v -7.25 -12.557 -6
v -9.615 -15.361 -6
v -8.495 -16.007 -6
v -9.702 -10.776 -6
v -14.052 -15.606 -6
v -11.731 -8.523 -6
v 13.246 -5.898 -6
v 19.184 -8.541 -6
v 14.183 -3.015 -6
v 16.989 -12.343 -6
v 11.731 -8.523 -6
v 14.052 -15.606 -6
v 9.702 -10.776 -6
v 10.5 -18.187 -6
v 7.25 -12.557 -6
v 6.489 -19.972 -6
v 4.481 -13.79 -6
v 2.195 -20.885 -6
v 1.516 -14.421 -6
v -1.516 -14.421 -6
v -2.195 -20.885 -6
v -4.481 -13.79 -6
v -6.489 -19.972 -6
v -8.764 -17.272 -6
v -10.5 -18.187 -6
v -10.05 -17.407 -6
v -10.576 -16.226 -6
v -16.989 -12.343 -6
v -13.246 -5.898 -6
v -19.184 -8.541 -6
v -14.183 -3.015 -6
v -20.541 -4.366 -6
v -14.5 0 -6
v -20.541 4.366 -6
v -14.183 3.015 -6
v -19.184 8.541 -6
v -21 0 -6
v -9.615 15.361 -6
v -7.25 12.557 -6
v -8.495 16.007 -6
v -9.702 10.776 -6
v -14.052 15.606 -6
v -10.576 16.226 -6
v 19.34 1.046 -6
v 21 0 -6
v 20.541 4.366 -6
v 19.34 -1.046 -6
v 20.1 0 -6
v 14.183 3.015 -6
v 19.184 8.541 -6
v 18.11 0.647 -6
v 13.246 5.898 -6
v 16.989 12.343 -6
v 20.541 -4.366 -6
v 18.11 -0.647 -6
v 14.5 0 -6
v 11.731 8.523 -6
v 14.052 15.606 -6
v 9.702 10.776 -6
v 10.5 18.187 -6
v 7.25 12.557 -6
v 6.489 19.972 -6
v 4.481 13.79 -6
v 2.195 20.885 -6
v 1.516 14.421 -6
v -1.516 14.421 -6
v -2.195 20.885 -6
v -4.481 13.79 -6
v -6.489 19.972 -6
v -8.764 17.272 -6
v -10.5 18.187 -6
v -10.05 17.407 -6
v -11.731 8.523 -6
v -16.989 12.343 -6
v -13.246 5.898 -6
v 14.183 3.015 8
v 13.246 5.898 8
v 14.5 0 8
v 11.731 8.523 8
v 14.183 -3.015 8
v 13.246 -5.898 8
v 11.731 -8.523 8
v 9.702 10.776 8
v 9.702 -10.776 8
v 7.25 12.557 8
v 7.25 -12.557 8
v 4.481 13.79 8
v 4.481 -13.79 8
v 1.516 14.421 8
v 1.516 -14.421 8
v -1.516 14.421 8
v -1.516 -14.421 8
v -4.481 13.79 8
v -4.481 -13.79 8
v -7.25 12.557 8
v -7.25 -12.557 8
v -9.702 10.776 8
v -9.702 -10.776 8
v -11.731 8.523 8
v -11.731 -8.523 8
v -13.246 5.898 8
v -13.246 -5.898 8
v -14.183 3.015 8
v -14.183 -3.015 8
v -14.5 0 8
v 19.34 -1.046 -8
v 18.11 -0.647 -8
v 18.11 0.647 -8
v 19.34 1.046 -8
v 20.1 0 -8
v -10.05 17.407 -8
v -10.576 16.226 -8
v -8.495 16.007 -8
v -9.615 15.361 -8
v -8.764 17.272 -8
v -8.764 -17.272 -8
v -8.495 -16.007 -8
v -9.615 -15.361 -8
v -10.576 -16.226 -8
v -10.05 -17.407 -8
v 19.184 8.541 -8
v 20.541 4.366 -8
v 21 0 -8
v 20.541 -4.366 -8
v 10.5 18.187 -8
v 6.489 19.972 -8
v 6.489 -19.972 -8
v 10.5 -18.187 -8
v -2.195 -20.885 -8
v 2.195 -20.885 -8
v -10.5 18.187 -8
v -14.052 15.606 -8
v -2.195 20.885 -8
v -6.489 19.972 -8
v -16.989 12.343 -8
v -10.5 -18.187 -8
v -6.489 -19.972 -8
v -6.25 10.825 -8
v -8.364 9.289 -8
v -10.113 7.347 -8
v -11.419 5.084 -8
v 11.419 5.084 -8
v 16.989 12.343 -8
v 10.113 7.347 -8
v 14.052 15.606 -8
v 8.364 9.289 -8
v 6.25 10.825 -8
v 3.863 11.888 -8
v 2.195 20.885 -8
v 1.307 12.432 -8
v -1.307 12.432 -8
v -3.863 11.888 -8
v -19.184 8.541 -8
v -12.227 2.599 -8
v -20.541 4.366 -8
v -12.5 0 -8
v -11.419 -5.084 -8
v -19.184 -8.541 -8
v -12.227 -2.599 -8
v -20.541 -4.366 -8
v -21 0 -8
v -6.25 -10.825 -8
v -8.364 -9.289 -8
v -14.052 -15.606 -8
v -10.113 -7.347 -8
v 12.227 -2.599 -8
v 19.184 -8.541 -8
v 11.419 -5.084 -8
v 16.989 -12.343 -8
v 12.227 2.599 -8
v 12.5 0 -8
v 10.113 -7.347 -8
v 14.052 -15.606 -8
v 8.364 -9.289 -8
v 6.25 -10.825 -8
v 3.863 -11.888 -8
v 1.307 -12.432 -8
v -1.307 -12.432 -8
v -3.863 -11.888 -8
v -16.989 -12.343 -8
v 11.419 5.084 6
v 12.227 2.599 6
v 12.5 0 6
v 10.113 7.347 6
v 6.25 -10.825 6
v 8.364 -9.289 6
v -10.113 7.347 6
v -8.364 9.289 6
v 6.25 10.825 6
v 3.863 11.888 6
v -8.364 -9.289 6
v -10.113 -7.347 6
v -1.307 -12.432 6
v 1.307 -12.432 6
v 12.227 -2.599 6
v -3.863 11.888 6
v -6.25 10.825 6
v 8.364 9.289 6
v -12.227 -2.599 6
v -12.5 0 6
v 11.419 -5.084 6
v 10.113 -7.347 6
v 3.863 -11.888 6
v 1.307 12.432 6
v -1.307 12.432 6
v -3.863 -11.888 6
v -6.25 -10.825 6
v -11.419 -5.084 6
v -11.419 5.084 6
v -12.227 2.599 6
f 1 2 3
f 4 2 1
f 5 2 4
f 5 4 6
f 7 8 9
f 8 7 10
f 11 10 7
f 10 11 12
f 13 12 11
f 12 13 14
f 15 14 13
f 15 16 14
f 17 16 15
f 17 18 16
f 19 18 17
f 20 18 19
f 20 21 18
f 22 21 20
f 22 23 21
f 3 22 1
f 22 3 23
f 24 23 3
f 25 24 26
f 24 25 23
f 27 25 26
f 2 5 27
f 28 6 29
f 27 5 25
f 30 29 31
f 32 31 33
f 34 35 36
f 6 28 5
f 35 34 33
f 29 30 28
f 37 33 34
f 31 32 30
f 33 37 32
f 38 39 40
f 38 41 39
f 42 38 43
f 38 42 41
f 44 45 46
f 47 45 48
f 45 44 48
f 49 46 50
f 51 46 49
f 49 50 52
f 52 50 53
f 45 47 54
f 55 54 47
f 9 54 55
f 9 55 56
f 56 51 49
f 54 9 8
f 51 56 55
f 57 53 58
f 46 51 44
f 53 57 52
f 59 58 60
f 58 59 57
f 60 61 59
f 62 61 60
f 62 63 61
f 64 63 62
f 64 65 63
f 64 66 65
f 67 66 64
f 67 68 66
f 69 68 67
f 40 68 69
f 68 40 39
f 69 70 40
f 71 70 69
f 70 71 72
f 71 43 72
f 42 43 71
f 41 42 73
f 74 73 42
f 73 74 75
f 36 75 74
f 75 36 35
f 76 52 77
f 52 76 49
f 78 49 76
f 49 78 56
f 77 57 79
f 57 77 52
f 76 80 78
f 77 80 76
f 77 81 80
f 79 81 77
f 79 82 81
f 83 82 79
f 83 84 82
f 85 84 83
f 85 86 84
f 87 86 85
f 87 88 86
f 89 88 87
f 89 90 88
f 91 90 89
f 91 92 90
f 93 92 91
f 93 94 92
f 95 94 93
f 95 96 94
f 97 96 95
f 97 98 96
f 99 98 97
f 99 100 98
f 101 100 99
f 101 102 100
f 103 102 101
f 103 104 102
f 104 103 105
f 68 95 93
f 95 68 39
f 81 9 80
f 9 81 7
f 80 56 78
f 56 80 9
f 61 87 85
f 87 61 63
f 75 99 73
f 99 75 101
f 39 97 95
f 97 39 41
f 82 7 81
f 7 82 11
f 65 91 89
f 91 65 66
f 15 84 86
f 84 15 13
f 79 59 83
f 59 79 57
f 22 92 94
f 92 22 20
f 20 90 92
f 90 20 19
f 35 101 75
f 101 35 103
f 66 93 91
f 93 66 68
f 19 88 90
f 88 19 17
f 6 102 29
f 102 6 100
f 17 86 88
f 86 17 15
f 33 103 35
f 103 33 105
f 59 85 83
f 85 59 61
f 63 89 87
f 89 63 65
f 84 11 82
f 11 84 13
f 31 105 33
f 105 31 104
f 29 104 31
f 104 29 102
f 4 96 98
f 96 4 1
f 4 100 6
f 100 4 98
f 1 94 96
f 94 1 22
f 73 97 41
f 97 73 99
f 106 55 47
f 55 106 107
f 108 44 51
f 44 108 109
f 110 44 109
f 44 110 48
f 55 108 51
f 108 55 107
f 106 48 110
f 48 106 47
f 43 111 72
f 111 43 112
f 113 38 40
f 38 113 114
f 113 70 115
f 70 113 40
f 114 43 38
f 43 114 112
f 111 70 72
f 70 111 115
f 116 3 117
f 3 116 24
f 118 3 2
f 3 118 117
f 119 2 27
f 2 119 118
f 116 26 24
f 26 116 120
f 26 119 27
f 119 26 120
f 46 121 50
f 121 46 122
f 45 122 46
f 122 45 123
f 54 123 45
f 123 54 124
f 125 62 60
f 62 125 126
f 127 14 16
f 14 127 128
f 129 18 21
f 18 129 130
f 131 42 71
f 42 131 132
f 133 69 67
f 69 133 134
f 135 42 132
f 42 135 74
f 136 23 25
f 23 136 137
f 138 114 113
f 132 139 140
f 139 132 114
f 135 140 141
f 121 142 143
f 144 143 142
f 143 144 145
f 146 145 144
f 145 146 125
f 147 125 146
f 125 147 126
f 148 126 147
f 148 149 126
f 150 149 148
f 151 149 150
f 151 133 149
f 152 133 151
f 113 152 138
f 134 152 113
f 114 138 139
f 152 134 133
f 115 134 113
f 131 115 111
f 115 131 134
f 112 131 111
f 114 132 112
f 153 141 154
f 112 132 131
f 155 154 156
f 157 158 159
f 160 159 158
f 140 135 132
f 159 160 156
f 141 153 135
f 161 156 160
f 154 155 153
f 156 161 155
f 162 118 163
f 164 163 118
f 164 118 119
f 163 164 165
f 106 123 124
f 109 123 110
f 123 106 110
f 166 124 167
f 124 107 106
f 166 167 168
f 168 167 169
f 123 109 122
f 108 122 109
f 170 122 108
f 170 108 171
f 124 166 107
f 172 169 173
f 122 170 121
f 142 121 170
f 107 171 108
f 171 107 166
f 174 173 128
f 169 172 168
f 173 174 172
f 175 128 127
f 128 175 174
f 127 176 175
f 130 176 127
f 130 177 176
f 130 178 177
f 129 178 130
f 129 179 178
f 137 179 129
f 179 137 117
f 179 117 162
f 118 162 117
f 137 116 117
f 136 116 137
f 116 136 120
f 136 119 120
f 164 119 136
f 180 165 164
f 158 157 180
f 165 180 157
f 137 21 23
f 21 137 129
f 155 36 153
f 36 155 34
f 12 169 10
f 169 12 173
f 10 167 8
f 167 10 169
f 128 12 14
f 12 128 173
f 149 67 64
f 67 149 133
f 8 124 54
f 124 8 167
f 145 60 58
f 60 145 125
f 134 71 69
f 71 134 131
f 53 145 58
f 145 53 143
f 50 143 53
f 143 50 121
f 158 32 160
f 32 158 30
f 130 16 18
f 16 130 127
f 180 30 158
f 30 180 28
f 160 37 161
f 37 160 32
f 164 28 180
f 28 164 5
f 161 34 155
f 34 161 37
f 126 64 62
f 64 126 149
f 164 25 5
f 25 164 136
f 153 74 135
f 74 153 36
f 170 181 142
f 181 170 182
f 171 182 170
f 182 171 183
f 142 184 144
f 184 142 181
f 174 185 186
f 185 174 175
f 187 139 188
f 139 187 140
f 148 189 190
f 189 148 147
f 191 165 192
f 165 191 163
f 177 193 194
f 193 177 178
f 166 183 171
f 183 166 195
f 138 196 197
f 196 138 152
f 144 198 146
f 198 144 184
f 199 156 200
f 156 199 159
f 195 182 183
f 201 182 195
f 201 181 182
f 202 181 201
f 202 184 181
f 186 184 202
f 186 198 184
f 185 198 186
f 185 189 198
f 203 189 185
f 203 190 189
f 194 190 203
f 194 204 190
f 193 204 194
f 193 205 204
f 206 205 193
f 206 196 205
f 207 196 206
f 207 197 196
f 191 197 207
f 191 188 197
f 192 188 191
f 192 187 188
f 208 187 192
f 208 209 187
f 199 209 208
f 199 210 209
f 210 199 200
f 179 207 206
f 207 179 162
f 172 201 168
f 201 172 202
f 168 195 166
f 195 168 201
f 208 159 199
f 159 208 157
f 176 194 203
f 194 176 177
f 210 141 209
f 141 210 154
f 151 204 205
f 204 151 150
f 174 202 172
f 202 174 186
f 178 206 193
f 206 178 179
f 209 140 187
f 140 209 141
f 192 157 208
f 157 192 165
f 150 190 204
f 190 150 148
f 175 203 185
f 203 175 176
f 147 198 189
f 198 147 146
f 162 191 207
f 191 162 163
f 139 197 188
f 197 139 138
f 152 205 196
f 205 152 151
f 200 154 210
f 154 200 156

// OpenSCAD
module magnets_holder()
{
    difference() {
        cylinder(h = 16, r = 21,center=true);
        translate(v = [0, 0, -2]) cylinder(h = 16, r = 12.5,center=true);
        translate(v = [0, 0, 2]) difference() {
            cylinder(h = 16, r = 22,center=true);
            translate(v = [0, 0, -2]) cylinder(h = 16, r = 29/2,center=true);
        }
        for(i = [0:120:360])
        {
            rotate(i, v = [0, 0, 1]) translate(v = [19, 0, 0]) cylinder(h = 20, r = 1.1, center=true);
        }
    }
}

magnets_holder();
